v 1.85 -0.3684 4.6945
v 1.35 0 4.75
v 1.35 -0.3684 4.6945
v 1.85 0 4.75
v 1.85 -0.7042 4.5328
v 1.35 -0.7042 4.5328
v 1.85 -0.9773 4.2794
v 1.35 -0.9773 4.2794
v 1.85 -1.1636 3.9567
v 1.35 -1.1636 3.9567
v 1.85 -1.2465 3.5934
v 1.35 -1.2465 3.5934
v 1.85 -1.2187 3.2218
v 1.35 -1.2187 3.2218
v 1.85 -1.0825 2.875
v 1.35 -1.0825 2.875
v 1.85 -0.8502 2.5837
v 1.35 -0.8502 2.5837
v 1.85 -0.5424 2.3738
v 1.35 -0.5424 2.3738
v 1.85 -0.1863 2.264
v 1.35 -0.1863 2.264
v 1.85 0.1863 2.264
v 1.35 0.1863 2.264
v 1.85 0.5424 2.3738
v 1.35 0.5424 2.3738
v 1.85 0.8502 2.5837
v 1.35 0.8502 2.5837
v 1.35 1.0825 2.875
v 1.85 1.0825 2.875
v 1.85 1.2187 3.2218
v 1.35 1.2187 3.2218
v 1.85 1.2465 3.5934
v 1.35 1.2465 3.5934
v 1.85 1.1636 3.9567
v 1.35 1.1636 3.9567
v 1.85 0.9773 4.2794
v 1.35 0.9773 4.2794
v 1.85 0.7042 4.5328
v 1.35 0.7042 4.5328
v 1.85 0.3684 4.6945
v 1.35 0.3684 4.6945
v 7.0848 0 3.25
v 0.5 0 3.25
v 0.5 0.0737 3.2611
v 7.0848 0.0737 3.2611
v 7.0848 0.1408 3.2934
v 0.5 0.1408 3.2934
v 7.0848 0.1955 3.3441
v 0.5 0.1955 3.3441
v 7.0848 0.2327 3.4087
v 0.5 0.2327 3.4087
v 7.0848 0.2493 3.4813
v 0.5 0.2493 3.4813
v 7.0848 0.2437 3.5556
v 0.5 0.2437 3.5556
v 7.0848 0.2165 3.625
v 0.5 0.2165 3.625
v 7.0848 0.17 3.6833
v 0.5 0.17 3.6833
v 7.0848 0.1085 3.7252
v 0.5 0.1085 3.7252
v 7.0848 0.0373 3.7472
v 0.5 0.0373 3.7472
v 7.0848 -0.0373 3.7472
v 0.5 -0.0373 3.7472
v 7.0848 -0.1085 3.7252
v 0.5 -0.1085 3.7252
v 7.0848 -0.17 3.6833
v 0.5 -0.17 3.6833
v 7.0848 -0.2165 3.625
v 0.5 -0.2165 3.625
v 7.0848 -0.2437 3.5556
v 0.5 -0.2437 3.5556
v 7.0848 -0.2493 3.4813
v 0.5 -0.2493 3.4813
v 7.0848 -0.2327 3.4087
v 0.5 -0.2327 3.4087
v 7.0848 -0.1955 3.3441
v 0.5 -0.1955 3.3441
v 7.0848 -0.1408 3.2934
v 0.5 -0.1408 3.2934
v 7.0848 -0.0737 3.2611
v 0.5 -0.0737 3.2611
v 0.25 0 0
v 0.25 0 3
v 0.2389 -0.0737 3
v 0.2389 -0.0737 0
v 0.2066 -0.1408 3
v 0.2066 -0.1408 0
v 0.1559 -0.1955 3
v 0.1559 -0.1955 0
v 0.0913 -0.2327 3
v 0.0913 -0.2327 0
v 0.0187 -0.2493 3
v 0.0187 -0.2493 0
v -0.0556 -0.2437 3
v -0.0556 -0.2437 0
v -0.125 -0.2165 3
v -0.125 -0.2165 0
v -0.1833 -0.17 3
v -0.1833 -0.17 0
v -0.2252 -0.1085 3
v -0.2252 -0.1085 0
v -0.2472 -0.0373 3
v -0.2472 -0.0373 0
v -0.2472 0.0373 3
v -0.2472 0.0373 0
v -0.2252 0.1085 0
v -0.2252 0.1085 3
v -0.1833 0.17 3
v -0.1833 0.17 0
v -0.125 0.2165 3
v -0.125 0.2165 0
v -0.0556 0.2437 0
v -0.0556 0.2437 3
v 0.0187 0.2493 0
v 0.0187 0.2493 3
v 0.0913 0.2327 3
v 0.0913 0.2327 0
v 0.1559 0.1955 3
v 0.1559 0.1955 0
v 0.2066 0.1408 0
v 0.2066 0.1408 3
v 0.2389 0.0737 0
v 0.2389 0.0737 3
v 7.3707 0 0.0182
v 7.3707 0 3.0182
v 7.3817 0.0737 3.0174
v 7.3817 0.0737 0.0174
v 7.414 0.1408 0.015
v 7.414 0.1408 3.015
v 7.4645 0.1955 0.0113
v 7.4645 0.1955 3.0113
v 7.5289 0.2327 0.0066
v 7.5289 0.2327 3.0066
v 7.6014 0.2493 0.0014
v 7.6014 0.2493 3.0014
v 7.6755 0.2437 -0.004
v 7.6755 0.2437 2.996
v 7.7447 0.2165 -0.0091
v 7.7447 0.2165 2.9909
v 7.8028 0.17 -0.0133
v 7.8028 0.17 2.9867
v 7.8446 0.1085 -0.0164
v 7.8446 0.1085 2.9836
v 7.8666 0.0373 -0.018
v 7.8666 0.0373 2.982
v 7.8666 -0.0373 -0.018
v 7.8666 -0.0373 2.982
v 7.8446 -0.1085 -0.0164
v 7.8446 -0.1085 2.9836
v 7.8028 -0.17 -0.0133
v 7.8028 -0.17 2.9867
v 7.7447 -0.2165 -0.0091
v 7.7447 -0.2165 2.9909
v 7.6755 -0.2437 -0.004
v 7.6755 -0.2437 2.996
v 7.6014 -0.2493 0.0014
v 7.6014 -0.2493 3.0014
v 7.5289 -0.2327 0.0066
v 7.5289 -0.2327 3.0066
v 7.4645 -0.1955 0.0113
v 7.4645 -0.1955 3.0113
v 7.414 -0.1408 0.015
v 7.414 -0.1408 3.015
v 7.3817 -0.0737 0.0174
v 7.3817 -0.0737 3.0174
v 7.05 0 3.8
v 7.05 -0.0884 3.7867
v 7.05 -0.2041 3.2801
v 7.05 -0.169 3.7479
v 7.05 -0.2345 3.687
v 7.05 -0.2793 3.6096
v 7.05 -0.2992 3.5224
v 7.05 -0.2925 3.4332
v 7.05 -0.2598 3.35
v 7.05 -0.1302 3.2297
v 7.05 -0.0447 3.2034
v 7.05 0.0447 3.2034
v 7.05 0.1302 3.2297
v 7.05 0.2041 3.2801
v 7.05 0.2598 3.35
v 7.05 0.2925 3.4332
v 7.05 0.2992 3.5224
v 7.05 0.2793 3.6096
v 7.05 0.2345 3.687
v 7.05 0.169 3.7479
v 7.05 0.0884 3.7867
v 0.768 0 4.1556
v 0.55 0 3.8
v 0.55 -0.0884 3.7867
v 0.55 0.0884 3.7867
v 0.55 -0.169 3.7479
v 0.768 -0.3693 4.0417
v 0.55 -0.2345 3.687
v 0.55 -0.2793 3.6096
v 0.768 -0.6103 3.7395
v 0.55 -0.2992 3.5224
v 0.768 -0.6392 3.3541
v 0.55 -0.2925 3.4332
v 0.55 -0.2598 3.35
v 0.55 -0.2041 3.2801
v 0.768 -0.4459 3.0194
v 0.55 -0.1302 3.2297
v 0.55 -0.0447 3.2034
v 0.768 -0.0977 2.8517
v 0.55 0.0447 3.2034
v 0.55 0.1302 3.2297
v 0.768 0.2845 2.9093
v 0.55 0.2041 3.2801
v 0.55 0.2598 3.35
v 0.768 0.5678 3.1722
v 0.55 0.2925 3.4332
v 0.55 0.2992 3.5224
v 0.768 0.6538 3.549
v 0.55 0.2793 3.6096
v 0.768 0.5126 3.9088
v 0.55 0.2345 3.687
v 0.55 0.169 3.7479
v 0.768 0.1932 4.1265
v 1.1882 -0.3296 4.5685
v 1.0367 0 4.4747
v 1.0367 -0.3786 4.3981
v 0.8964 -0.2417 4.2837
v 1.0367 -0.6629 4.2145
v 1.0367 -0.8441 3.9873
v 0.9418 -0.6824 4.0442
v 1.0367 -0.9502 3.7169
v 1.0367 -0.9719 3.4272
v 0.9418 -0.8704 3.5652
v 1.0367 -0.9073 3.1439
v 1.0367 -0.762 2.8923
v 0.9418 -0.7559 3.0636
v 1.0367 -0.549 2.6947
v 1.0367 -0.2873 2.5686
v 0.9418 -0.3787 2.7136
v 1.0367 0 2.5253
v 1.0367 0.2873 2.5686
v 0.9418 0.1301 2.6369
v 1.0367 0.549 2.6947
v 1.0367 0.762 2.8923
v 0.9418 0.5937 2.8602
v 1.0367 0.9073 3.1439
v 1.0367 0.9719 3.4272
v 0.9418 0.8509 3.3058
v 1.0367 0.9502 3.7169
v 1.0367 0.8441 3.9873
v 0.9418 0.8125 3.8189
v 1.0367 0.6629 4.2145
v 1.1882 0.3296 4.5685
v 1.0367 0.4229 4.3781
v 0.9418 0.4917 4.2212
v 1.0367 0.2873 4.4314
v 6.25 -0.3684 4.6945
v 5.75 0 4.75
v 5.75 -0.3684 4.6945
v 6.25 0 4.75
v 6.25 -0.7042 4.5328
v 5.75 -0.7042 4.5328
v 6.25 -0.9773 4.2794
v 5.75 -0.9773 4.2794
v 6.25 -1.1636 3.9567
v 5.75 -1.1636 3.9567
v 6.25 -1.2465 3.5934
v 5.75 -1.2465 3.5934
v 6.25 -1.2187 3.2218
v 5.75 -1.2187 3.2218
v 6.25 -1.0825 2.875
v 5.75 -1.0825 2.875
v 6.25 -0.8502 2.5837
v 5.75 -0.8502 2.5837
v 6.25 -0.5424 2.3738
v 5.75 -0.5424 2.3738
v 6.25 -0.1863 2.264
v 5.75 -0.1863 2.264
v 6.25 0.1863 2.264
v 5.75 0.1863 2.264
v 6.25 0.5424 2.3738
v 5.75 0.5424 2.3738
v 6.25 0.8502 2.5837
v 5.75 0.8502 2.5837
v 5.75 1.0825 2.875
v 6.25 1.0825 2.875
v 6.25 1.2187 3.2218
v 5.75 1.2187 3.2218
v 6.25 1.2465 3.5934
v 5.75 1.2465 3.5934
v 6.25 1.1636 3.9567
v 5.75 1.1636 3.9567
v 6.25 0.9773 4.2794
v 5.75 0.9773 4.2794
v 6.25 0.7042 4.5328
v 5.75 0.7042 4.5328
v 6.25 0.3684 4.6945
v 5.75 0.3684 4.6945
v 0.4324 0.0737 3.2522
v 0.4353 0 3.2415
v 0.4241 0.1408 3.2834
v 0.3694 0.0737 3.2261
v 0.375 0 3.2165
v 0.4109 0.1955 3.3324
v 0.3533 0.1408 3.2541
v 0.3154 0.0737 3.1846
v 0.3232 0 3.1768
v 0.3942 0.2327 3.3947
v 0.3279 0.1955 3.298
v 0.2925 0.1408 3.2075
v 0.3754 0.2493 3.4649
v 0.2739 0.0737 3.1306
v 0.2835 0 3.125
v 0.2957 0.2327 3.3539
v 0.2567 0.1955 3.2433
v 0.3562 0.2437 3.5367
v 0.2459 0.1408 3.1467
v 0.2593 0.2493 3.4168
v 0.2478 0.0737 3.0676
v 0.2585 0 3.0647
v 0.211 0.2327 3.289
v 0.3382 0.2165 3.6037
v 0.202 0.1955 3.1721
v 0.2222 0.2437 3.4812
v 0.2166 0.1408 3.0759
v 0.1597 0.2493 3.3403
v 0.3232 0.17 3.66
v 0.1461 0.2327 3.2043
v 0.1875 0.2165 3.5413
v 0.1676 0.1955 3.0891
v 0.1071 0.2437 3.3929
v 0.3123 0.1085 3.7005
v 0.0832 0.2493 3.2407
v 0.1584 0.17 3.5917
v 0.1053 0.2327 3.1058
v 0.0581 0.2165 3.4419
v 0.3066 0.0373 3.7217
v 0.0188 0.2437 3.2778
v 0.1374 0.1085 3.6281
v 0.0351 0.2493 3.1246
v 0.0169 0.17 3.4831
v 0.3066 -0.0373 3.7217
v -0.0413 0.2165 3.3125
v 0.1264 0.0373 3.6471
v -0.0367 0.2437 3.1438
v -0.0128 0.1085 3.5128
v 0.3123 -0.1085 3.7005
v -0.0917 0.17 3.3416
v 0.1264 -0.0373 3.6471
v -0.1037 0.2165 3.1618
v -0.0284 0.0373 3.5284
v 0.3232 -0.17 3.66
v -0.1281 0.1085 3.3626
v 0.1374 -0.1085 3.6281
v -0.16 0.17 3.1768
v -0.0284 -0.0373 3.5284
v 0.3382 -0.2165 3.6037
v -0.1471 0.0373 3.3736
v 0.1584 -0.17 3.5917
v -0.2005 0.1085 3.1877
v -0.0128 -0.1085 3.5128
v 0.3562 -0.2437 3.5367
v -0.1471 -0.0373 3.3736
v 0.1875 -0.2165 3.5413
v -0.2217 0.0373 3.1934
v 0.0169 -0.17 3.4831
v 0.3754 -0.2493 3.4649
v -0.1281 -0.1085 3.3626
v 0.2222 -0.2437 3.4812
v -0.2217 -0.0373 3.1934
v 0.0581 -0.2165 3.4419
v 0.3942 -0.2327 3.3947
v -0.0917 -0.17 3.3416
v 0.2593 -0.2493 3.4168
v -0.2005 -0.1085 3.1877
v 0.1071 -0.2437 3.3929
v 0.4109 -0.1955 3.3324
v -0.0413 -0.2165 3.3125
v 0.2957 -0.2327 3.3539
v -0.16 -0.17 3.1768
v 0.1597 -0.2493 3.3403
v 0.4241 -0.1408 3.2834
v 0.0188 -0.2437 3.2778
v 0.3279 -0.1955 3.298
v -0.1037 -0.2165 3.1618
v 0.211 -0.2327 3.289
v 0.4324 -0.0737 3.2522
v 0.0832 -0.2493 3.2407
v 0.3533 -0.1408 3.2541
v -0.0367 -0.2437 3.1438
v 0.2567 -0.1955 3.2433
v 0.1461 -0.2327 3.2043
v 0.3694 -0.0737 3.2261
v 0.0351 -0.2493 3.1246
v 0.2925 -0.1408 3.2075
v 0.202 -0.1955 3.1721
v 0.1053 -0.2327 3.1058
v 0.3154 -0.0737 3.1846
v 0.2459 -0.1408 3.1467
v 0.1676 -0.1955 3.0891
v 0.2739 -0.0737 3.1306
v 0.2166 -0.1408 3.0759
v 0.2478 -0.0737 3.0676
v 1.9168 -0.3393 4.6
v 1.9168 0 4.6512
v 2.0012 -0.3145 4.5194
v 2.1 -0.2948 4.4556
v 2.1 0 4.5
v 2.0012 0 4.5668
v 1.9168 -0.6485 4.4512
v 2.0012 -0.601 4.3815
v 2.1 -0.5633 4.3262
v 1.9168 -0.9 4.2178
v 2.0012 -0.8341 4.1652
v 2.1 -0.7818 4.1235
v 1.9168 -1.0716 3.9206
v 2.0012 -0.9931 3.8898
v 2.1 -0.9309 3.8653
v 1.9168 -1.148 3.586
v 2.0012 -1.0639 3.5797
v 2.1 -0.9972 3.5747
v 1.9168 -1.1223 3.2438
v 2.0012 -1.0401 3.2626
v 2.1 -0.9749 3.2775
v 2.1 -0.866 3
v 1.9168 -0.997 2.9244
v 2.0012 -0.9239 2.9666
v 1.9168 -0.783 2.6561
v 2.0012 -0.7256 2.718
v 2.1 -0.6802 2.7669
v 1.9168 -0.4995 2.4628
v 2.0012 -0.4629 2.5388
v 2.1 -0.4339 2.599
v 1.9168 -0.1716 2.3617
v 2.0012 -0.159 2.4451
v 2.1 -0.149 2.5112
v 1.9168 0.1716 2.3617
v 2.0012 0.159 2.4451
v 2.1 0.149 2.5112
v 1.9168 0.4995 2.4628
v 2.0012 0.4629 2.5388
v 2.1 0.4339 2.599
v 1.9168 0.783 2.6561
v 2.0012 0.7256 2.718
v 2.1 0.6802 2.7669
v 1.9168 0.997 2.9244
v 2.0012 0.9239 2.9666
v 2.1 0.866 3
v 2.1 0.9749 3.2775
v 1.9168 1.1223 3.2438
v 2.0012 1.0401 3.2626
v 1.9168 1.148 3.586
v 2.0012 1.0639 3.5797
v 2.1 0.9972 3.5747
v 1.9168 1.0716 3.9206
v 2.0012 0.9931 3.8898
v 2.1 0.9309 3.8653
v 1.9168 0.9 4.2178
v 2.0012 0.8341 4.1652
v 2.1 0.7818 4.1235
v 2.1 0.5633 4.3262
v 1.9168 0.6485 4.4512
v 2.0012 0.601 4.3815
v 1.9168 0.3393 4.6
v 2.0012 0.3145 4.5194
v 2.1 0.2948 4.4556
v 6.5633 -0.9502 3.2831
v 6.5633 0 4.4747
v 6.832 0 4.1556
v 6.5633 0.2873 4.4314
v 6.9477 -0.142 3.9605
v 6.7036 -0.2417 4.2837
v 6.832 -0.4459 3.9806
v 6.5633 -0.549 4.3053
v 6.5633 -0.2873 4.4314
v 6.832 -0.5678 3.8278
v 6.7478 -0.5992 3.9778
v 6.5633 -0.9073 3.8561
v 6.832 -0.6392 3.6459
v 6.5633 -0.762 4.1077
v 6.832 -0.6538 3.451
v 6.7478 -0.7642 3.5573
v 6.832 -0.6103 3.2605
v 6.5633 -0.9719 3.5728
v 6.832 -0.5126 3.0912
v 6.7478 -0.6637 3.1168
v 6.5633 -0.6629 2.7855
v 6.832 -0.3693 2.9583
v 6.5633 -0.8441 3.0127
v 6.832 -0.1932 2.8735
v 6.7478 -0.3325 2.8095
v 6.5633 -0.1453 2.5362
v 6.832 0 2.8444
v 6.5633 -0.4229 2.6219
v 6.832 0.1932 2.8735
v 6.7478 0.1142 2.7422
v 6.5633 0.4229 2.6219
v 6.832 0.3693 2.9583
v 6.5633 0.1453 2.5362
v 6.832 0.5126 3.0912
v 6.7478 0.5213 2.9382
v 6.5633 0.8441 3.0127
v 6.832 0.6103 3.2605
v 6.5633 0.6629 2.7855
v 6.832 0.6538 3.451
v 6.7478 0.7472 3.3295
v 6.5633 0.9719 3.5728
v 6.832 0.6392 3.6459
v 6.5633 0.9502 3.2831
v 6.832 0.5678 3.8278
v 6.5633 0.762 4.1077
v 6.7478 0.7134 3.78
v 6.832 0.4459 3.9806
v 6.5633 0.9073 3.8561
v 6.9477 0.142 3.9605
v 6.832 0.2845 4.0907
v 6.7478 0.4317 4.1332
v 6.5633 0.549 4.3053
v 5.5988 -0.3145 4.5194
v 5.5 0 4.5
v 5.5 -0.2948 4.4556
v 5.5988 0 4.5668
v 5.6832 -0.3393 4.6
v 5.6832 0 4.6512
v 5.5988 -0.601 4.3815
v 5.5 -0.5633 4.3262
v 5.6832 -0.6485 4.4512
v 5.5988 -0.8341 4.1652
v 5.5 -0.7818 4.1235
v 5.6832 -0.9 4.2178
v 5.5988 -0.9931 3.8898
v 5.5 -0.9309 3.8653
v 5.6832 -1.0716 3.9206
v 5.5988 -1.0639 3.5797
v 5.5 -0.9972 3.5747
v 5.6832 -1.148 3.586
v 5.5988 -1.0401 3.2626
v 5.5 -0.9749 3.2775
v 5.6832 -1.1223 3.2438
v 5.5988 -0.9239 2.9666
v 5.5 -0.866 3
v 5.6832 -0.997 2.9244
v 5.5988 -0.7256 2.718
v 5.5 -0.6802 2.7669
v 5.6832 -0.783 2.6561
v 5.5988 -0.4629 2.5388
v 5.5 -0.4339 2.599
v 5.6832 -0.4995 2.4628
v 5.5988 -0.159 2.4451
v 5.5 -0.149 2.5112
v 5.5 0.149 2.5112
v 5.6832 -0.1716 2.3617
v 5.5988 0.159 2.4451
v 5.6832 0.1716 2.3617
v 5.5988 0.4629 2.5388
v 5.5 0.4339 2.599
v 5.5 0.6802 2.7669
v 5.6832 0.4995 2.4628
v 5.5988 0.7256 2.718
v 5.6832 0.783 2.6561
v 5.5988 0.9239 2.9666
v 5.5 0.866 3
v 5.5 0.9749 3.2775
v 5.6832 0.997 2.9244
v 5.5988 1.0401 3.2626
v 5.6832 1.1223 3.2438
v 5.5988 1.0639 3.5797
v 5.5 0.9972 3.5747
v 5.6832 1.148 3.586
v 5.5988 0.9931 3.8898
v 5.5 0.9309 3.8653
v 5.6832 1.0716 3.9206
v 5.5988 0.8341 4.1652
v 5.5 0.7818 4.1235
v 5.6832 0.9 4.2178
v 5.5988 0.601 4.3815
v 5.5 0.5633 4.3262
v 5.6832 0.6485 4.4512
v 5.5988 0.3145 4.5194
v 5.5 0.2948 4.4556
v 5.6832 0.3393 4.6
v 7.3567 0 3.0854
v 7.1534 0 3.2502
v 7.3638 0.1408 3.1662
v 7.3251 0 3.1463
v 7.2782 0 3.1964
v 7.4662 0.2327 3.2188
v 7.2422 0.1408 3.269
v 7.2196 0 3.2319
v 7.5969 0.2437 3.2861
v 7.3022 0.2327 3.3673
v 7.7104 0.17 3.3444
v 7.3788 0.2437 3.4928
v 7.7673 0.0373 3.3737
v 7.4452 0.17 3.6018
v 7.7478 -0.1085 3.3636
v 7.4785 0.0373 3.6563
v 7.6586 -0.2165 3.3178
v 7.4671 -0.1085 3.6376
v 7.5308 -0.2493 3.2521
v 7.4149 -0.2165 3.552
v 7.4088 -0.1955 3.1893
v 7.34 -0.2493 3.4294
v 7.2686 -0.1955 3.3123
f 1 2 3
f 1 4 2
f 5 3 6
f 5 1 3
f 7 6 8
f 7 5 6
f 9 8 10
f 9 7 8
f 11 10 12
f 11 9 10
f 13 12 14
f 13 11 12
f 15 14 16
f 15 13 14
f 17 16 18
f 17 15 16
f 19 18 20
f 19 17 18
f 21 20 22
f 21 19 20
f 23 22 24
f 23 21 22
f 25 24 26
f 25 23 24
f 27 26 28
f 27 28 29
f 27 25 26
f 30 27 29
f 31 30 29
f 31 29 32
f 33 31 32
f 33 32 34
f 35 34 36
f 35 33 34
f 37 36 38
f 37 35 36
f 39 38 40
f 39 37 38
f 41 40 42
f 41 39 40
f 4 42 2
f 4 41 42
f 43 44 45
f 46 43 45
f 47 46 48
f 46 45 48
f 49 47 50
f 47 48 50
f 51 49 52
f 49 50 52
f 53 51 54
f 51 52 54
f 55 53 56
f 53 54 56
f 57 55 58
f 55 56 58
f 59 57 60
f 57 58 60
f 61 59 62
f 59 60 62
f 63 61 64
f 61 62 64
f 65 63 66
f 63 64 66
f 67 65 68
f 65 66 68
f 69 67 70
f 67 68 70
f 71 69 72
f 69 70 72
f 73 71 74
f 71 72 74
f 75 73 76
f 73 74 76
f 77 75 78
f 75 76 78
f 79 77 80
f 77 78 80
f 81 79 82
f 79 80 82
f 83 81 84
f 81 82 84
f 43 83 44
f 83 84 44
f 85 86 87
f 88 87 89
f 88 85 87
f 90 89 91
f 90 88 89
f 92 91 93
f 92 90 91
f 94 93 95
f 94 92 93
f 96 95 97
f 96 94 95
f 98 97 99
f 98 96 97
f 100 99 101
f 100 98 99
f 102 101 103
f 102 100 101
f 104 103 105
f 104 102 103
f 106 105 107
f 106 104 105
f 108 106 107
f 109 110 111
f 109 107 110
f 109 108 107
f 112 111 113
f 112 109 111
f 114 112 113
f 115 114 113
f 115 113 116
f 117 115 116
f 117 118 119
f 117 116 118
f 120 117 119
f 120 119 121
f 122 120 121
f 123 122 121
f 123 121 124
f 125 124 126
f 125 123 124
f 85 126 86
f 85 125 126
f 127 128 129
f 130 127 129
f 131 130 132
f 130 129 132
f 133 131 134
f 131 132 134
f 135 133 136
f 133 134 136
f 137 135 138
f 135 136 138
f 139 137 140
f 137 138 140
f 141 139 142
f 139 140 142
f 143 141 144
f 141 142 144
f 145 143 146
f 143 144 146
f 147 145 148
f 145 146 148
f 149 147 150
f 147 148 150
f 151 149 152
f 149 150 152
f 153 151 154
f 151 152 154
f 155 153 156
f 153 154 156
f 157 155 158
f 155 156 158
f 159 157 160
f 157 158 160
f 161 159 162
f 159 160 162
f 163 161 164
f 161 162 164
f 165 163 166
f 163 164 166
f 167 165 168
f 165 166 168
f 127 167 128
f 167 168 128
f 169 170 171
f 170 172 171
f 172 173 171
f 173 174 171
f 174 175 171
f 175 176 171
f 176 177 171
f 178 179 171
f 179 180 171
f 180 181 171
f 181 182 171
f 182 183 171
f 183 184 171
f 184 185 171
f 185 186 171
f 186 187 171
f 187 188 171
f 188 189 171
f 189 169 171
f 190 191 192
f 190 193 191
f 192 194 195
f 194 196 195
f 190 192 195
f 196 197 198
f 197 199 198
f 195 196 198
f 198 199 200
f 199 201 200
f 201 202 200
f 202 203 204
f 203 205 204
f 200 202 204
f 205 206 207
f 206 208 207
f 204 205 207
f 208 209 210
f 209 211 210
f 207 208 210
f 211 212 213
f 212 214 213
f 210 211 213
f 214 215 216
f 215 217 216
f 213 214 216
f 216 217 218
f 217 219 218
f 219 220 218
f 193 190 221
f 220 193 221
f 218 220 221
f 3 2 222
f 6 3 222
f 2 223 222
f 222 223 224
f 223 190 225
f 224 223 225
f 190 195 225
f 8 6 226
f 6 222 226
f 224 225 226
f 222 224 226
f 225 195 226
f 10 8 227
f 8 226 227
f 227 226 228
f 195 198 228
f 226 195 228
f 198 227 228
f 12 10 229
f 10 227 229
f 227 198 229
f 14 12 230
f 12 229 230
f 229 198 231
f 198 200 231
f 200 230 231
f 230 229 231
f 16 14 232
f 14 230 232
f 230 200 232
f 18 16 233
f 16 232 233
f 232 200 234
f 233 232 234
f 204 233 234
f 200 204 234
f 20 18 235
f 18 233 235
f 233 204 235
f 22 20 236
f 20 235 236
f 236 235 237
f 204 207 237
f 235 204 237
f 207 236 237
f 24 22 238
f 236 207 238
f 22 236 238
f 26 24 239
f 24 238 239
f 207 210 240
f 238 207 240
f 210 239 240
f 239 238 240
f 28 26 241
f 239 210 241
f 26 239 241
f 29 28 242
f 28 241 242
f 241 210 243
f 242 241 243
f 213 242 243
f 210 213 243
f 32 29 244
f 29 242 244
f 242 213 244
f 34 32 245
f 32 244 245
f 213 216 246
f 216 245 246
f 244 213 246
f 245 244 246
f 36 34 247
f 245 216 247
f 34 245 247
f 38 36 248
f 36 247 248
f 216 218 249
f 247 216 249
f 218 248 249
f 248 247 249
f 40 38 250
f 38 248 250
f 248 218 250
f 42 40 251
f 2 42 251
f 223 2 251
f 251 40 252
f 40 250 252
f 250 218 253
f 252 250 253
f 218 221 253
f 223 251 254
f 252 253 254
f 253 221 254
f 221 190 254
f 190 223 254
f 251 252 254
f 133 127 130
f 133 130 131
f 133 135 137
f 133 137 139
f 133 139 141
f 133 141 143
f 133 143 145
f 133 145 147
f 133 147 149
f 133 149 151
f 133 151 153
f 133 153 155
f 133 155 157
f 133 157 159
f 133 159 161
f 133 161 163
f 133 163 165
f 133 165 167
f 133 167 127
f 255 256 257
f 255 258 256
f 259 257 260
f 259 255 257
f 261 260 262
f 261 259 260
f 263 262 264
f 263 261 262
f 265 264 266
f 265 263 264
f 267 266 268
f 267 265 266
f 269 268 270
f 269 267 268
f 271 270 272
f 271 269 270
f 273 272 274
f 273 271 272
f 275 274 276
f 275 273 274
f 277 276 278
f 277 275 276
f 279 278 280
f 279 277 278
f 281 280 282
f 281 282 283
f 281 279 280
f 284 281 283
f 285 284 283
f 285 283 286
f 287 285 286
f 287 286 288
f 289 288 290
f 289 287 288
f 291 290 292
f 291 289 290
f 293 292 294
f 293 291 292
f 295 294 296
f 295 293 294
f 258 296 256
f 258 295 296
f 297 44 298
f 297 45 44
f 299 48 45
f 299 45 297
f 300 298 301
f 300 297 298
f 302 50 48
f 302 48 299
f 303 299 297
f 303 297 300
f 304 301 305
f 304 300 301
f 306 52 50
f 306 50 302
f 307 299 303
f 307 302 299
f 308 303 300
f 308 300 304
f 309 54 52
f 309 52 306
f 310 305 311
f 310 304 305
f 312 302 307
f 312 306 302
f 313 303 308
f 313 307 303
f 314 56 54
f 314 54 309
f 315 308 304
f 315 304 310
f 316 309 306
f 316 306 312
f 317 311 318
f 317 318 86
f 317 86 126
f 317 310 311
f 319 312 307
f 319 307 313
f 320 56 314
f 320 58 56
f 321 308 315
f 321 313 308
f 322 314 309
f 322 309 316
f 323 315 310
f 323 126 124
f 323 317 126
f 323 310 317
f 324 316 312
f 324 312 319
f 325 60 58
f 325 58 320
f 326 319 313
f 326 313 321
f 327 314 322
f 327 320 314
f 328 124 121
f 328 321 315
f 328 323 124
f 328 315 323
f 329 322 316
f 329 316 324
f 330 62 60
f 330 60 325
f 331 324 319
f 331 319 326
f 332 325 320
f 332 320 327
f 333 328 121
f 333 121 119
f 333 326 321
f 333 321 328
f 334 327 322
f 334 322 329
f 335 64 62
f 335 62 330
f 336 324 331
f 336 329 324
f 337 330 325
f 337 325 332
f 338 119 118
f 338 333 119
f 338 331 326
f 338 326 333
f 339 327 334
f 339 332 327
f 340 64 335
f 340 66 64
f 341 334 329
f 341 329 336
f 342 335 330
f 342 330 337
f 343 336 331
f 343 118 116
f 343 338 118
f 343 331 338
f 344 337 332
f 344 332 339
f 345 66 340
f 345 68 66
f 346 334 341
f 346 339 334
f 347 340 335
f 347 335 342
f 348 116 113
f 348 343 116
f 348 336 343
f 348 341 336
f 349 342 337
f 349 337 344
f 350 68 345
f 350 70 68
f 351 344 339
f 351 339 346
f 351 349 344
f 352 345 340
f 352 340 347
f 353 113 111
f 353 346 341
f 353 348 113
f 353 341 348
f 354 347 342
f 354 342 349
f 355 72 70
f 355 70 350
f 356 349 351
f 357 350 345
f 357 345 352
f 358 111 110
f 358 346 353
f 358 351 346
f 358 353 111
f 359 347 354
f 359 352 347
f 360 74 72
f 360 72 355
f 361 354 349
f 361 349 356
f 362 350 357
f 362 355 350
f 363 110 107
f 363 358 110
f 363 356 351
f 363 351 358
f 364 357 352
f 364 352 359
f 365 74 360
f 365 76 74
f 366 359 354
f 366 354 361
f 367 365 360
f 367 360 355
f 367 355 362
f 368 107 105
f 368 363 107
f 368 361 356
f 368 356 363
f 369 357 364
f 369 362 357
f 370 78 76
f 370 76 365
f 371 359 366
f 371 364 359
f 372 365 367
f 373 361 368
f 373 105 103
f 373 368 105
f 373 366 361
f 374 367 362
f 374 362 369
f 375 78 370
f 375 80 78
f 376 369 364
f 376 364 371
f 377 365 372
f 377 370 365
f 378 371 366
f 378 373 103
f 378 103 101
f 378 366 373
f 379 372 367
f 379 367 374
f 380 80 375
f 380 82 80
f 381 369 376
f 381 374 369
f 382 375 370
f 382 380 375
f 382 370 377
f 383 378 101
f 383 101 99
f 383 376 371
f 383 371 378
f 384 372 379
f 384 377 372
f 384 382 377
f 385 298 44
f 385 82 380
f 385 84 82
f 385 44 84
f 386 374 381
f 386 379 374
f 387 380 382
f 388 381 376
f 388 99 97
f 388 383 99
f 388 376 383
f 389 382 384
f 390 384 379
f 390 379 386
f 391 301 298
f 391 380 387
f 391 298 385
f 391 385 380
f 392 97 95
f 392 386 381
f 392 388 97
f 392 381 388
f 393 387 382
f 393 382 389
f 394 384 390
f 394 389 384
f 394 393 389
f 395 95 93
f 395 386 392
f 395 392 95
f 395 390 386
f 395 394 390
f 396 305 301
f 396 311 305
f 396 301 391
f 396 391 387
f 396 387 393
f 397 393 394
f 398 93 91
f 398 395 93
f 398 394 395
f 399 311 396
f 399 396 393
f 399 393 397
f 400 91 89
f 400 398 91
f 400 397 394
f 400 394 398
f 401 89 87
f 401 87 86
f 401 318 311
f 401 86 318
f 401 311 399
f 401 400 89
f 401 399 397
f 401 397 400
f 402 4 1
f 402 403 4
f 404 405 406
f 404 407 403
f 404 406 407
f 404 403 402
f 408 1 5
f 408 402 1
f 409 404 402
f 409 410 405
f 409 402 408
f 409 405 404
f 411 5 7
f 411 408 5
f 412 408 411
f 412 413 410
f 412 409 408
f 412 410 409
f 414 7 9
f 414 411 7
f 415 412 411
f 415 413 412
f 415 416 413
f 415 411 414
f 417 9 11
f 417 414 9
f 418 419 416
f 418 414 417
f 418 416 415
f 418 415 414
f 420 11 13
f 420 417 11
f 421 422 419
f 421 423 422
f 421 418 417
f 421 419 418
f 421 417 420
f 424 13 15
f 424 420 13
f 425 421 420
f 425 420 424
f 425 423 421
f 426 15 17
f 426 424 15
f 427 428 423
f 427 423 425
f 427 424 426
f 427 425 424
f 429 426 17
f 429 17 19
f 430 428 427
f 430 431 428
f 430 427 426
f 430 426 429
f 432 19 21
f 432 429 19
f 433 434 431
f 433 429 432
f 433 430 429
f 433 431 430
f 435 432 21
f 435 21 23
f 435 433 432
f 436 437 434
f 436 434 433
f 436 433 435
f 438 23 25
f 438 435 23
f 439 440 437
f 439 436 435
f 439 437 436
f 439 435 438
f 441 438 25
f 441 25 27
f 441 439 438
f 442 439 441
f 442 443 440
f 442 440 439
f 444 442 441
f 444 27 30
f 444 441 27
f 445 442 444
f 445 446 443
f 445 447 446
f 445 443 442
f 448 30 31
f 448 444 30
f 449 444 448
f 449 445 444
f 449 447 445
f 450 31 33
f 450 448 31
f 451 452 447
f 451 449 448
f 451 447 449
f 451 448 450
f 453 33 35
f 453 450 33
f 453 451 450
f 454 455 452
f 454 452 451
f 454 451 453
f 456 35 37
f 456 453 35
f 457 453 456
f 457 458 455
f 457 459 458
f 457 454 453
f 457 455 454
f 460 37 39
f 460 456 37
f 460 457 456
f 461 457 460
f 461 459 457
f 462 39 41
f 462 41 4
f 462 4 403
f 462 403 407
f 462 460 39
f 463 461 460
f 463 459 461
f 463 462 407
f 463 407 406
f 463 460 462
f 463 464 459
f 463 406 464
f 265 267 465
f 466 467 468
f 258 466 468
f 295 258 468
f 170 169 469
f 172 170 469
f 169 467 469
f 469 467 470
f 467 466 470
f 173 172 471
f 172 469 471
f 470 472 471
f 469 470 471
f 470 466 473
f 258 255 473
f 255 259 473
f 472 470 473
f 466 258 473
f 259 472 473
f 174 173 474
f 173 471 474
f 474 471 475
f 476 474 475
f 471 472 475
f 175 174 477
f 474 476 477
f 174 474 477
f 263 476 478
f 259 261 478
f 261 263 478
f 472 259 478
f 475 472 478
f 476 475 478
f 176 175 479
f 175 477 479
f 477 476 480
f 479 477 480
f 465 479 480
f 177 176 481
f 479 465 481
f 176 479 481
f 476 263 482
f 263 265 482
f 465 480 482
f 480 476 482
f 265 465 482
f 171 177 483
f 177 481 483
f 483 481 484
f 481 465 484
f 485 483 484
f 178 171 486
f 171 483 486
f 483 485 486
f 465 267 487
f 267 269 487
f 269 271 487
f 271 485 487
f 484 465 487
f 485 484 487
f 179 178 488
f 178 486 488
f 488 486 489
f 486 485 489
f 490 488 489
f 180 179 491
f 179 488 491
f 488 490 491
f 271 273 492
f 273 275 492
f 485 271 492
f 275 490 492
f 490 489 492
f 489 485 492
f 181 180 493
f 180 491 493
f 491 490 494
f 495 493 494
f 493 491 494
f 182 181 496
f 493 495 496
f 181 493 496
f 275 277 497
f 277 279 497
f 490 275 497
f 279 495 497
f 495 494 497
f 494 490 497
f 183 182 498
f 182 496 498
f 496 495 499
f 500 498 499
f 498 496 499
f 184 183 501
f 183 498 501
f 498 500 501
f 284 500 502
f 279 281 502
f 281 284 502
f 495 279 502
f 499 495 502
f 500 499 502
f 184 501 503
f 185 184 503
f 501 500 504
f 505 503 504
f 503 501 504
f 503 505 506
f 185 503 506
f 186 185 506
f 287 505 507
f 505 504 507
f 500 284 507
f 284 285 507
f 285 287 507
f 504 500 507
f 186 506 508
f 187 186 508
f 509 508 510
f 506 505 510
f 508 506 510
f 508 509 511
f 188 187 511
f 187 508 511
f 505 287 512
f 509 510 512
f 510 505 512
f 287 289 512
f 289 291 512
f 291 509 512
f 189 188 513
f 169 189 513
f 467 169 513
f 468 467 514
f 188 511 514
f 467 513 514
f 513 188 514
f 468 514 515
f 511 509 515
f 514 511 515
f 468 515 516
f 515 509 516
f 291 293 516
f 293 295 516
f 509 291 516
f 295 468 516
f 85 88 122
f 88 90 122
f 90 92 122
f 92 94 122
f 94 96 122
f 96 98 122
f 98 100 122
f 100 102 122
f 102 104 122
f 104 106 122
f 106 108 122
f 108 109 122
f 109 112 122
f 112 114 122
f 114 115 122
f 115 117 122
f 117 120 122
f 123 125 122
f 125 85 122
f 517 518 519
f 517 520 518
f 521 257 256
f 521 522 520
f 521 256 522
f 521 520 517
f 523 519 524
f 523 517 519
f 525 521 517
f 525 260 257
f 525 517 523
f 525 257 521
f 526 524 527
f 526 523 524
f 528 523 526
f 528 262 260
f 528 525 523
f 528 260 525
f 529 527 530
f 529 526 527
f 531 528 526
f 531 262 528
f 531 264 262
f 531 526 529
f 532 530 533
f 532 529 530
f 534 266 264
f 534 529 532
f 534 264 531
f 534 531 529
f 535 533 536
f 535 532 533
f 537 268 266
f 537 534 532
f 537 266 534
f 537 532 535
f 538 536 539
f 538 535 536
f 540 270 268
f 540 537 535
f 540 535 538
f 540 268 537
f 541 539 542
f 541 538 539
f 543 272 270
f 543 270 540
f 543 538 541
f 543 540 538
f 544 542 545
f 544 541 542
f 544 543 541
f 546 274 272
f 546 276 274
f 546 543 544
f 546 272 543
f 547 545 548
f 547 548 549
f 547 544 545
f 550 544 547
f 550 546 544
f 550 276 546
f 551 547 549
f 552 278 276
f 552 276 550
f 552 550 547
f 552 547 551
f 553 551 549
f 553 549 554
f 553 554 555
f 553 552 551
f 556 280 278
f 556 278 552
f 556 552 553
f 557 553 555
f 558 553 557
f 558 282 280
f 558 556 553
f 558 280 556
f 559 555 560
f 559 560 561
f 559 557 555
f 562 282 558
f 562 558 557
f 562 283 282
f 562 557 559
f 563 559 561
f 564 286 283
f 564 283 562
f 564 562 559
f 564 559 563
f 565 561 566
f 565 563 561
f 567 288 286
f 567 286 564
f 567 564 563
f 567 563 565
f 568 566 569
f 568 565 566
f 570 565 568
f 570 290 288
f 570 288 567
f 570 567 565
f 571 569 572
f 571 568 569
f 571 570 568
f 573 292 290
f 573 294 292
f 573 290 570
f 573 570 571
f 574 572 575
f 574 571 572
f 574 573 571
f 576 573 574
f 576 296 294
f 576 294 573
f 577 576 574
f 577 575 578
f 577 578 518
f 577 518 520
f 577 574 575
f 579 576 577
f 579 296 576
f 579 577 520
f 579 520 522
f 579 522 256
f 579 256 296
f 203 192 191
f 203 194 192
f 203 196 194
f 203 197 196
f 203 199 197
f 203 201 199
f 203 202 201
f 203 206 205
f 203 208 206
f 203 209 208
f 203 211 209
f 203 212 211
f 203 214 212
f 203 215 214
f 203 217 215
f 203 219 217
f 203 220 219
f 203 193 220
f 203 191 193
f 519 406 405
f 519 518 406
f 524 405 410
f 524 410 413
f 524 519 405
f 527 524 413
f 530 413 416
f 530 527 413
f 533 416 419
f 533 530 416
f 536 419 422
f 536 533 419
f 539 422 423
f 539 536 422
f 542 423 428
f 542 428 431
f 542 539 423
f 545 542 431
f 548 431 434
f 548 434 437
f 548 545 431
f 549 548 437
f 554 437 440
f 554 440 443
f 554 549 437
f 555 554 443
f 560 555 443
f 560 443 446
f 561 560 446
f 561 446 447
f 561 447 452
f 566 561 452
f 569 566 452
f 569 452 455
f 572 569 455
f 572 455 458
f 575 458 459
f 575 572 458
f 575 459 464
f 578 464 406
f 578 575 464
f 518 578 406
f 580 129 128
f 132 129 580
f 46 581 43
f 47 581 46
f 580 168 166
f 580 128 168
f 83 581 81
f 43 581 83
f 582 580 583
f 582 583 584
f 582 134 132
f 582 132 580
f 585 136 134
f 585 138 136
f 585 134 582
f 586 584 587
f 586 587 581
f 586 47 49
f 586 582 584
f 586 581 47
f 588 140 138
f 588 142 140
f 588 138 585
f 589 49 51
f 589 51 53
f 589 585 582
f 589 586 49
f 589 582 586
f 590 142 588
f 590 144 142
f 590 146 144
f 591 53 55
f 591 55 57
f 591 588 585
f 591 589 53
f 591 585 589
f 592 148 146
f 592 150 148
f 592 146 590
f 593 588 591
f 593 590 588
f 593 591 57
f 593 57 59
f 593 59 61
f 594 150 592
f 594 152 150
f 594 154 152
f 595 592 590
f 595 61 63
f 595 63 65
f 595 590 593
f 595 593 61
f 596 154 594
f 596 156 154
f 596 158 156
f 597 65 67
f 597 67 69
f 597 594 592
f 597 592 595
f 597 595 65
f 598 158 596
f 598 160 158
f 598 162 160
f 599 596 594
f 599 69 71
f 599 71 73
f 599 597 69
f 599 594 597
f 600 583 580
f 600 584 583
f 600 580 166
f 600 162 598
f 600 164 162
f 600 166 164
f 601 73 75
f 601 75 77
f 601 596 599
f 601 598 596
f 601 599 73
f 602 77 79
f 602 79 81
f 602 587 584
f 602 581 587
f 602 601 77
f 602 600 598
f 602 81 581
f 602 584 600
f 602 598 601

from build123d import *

# Parameters (mm, degrees)
SKETCH_R = 0.25


with BuildPart() as revolution:
    # Sketch002 → Revolution (revolve)
    with BuildSketch(Plane.XZ):
        with BuildLine():
            Line((1.35, 4.75), (1.85, 4.75))
            ThreePointArc((1.85, 4.75), (1.956999, 4.606999), (2.1, 4.5))
            Line((2.1, 4.5), (5.5, 4.5))
            ThreePointArc((5.5, 4.5), (5.643001, 4.606999), (5.75, 4.75))
            Line((5.75, 4.75), (6.25, 4.75))
            ThreePointArc((7.05, 3.8), (6.703637, 4.320168), (6.25, 4.75))
            Line((7.05, 3.5), (7.05, 3.8))
            Line((0.55, 3.5), (7.05, 3.5))
            Line((0.55, 3.5), (0.55, 3.8))
            ThreePointArc((1.35, 4.75), (0.896363, 4.320168), (0.55, 3.8))
        make_face()
    revolve(axis=Axis((0.55, 0, 3.5), (1, 0, 0)))


with BuildPart() as sweep_body:
    # Sweep: sweep along a path in Sketch001
    with BuildLine(Plane.XZ) as sweep_path:
        Line((7.62, 0), (7.62, 3))
        ThreePointArc((7.62, 3), (7.461347, 3.366591), (7.084834, 3.5))
        Line((7.084834, 3.5), (0.5, 3.5))
        ThreePointArc((0.5, 3.5), (0.146447, 3.353553), (0, 3))
        Line((0, 3), (0, 0))
    # Sketch → Sweep (sweep)
    with BuildSketch(Plane.XY):
        Circle(SKETCH_R)
    sweep(path=sweep_path.line, is_frenet=True)


solid = Compound([revolution.part, sweep_body.part])
